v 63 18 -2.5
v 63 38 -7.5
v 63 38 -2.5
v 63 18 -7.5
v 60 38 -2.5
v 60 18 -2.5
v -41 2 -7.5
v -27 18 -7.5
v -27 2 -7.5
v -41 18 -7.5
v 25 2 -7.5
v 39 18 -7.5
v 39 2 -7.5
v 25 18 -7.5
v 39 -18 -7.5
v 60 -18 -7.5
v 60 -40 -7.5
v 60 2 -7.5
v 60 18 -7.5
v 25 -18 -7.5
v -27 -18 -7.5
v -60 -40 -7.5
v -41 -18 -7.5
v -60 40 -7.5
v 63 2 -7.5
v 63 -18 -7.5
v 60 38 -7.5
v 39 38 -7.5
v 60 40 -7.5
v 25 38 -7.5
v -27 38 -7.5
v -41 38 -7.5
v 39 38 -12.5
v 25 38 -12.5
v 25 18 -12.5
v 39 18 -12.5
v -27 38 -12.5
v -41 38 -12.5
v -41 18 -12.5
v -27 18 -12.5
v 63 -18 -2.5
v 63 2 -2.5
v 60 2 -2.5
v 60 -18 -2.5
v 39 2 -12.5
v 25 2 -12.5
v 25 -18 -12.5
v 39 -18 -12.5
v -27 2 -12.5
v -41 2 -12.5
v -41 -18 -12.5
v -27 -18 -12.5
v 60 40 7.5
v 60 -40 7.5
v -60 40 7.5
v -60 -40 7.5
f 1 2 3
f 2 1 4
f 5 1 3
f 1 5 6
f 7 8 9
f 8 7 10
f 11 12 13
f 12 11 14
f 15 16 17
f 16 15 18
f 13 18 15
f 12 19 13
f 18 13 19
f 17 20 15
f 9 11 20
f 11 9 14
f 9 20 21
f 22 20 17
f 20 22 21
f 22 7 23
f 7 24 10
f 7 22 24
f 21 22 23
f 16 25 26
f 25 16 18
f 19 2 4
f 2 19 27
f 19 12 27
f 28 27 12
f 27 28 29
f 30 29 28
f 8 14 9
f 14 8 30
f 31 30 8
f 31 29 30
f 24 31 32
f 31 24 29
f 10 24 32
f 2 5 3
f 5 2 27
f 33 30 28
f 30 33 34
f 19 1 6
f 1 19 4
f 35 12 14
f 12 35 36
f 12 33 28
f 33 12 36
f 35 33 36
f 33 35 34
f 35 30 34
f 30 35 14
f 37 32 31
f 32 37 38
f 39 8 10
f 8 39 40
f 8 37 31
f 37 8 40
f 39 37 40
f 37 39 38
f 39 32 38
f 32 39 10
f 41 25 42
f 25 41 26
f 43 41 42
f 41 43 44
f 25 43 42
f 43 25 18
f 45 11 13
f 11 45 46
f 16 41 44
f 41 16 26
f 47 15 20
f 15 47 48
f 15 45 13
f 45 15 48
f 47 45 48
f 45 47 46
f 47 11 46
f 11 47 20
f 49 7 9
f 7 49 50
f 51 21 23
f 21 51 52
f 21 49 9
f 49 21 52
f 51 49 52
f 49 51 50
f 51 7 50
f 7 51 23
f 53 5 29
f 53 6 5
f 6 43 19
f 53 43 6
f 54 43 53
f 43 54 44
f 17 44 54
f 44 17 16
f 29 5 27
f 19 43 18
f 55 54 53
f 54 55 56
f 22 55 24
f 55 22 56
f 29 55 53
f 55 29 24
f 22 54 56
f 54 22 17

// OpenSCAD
// Parameters (all dimensions in mm)
slab_width = 120;
slab_depth = 80;
slab_height = 15;

pad_width = 30;
pad_depth = 20;
pad_height = 5;

cont_width = 14;
cont_height = 8;

edge_margin = 12;
align_left = true;

$fn = 64;

// Derived reference for slab bottom face
z_slab_bottom = -slab_height / 2;

// Main Assembly
union() {
    // Centered main rectangular slab
    cube([slab_width, slab_depth, slab_height], center=true);

    // Instantiate four corner underside features
    underside_feature( 1,  1);
    underside_feature(-1,  1);
    underside_feature( 1, -1);
    underside_feature(-1, -1);
}

// Module: Two-tier underside protrusion
module underside_feature(sx, sy) {
    // Calculate pad center coordinates relative to slab edges
    px = sx * (slab_width / 2 - edge_margin - pad_width / 2);
    py = sy * (slab_depth / 2 - edge_margin - pad_depth / 2);

    // Calculate continuation X offset to share left or right edge with pad
    edge_shift = (pad_width - cont_width) / 2;
    cx = px + (align_left ? -edge_shift : edge_shift);

    // Shallow tier: pad attached directly to slab bottom
    translate([px, py, z_slab_bottom])
        cube([pad_width, pad_depth, pad_height]);

    // Deeper tier: continuation attached below the pad, sharing front/back edges
    translate([cx, py, z_slab_bottom - pad_height])
        cube([cont_width, pad_depth, cont_height]);
}
